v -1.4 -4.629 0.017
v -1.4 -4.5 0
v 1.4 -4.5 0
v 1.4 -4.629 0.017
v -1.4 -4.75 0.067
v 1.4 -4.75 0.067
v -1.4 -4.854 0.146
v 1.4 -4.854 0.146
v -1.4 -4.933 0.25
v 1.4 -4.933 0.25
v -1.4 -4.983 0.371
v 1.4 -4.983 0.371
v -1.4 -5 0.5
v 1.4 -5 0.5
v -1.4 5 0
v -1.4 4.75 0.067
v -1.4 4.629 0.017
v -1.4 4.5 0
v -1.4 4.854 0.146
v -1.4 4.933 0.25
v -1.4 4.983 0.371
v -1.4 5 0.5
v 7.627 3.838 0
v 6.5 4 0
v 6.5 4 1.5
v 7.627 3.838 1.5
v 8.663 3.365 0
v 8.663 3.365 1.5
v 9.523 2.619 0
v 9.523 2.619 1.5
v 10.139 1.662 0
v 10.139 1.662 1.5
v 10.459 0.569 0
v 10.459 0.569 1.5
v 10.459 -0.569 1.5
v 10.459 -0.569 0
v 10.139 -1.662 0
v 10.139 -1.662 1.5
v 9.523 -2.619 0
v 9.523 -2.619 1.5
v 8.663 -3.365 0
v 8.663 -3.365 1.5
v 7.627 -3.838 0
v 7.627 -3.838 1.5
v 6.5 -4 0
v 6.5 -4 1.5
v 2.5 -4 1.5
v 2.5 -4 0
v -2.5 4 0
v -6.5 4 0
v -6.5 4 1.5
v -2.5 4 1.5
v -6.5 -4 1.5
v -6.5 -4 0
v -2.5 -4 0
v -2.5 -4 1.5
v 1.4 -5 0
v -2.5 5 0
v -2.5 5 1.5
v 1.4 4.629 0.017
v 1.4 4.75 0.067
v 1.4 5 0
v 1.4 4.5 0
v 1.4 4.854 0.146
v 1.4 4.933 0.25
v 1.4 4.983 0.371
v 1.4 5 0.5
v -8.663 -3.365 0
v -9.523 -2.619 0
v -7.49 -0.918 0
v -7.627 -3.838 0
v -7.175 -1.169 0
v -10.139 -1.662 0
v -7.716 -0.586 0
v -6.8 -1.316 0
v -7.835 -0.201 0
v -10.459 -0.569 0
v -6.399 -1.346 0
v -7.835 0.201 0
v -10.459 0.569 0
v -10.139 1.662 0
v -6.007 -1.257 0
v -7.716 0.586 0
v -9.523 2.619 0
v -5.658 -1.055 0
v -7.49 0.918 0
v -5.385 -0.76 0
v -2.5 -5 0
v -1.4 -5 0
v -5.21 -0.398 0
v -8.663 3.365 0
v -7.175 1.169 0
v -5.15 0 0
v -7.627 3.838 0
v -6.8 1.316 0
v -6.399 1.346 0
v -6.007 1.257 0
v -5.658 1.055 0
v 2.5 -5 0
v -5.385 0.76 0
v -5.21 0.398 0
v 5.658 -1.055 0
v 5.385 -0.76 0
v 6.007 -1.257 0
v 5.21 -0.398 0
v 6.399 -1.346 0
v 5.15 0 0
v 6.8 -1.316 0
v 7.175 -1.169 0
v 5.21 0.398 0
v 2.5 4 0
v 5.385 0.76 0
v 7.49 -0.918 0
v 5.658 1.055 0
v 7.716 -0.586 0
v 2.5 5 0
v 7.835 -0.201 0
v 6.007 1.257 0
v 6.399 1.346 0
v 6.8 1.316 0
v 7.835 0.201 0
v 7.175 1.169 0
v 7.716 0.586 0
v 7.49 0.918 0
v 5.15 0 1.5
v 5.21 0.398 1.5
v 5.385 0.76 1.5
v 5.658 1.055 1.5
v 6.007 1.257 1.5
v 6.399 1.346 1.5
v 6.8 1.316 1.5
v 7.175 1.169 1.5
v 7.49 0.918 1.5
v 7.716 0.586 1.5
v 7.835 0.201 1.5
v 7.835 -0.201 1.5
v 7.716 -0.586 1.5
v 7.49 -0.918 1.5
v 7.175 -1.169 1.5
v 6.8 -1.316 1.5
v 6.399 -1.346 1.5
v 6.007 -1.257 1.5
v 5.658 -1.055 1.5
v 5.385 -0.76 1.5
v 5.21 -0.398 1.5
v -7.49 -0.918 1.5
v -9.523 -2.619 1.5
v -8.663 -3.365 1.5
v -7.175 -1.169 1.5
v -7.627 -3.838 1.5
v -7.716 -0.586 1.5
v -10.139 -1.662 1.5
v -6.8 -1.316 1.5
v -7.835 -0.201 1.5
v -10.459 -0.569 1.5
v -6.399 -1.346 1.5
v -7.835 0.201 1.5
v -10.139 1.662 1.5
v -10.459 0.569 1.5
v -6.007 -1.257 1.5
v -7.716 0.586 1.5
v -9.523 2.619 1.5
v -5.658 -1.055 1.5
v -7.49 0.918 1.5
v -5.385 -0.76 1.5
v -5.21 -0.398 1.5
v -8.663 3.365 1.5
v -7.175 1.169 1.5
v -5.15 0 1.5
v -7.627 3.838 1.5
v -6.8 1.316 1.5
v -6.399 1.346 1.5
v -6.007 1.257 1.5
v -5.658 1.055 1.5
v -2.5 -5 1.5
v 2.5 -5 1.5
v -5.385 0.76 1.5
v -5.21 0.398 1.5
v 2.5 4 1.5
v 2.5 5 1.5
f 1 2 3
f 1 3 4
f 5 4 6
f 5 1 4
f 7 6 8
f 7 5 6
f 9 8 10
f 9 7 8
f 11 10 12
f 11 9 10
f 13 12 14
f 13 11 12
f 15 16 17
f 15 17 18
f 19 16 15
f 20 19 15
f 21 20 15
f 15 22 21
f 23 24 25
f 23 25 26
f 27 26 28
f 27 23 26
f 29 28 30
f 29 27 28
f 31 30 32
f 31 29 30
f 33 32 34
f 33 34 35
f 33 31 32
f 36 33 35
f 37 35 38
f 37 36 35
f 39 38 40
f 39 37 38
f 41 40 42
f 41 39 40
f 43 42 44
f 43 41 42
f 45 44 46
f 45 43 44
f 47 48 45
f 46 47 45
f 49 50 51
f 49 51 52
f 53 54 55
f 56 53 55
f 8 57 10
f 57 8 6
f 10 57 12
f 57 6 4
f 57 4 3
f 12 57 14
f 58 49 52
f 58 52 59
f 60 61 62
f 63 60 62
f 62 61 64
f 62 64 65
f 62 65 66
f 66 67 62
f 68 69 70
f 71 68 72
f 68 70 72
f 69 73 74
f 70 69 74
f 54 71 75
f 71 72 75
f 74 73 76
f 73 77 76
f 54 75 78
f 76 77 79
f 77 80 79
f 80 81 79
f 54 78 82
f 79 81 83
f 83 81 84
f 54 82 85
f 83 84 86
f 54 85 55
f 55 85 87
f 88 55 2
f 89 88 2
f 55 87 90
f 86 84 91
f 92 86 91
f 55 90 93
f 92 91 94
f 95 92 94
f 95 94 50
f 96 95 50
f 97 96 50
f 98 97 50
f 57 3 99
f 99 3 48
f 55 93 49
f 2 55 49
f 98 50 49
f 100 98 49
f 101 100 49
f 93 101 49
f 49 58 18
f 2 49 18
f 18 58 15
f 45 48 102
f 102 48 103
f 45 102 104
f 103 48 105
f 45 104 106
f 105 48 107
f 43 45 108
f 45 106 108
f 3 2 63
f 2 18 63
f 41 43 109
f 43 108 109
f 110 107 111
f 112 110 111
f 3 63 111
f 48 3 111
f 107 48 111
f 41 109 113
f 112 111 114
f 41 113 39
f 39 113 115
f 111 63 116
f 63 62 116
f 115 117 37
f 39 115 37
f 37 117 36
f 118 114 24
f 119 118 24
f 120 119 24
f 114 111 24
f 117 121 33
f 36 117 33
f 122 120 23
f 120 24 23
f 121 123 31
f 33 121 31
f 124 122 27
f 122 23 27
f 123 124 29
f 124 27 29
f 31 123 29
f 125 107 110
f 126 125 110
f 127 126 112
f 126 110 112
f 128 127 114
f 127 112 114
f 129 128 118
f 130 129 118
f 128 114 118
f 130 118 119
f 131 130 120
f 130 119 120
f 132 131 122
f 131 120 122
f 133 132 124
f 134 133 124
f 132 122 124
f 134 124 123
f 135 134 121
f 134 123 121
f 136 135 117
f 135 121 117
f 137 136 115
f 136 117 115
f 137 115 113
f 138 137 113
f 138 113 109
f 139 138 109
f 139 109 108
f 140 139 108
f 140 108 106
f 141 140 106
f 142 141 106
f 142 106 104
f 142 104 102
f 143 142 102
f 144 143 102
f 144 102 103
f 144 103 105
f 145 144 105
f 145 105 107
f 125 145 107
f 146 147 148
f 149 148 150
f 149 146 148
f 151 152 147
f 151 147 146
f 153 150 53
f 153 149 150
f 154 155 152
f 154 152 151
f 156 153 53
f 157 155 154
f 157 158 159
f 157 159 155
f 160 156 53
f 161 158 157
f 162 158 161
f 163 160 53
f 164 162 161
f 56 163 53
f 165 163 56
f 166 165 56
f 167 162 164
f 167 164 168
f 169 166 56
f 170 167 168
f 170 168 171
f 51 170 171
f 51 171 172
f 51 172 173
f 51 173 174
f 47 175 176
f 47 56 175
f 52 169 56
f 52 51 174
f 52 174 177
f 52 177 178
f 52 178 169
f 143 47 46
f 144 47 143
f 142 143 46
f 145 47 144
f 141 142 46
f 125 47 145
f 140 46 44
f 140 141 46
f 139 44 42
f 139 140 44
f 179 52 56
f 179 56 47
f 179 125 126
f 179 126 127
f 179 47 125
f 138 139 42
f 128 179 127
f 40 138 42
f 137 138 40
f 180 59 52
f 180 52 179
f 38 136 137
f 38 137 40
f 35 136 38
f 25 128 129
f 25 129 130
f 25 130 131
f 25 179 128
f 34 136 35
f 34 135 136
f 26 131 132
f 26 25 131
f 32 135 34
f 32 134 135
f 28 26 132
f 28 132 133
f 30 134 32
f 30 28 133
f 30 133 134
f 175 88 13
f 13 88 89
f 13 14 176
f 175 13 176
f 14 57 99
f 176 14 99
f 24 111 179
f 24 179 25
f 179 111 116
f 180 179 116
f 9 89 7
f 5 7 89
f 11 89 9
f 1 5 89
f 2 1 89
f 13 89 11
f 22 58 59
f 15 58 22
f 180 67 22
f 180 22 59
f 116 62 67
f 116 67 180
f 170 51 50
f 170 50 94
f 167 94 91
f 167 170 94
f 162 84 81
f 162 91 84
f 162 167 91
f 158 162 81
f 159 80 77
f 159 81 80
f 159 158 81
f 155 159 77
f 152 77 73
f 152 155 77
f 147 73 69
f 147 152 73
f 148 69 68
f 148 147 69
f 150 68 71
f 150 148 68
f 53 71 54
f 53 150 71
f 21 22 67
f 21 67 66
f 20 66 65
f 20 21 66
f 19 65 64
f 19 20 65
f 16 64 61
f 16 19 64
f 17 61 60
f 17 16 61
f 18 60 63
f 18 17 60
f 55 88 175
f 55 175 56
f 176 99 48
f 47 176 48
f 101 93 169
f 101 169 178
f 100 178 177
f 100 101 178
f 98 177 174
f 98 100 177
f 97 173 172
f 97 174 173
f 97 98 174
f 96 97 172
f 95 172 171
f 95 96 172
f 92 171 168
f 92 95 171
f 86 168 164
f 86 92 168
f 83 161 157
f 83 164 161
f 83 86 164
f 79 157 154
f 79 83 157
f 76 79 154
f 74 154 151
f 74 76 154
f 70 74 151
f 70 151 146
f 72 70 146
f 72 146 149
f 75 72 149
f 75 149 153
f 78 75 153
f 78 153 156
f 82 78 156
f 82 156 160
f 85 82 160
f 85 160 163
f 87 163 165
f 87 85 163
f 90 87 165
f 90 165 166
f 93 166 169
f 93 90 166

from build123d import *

# Parameters (mm, degrees)
SKETCH_1_W           = 8
SKETCH_1_H           = 8
SKETCH_1_W_2         = 5
SKETCH_1_H_2         = 10
EXTRUDE_709_DEPTH    = 1.5
HOLE_WIZARD_M2_5_1_D = 2.7
FILLET_1_RADIUS      = 4
FILLET_1_LENGTH      = 1.5
FILLET_2_RADIUS      = 4
FILLET_2_LENGTH      = 1.5
FILLET_START         = -1.4
FILLET_3_DEPTH       = 2.8


with BuildPart() as part:
    # 草图1 → Extrude 709 (new body)
    with BuildSketch(Plane.XY):
        with Locations((6.5, 0)):
            Rectangle(SKETCH_1_W, SKETCH_1_H)
        Rectangle(SKETCH_1_W_2, SKETCH_1_H_2)
        with Locations((-6.5, 0)):
            Rectangle(SKETCH_1_W, SKETCH_1_H)
    extrude(amount=EXTRUDE_709_DEPTH)

    # M2.5 间隙孔1 (through all)
    with Locations(Plane.XY.offset(1.5)):
        with Locations((6.5, 0)):
            hole_wizard_m2_5_1 = Hole(HOLE_WIZARD_M2_5_1_D / 2)

    # 镜向2: M2.5 间隙孔1 across plane
    add(hole_wizard_m2_5_1.mirror(Plane(origin=(0, 0, 0), x_dir=(0, 0, 1), z_dir=(1, 0, 0))), mode=Mode.SUBTRACT)

    # 圆角1: full round fillet: the end face becomes a half cylinder, R = half its width
    fillet_1_face = Plane((10.5, 0, 0.75), x_dir=(0, 0, -1), z_dir=(1, 0, 0))  # on the end face: x along it, z out of the body
    fillet_1_slab = fillet_1_face.offset(-FILLET_1_RADIUS / 2) * Box(FILLET_1_LENGTH, 2 * FILLET_1_RADIUS, FILLET_1_RADIUS, mode=Mode.PRIVATE)  # the body's end, R deep
    fillet_1_round = Plane((6.5, 0, 0.75), x_dir=(1, 0, 0), z_dir=(0, 0, -1)) * Cylinder(FILLET_1_RADIUS, FILLET_1_LENGTH, mode=Mode.PRIVATE)  # its axis R under the face
    add(fillet_1_slab - fillet_1_round, mode=Mode.SUBTRACT)

    # 圆角2: full round fillet: the end face becomes a half cylinder, R = half its width
    fillet_2_face = Plane((-10.5, 0, 0.75), x_dir=(0, 0, 1), z_dir=(-1, 0, 0))  # on the end face: x along it, z out of the body
    fillet_2_slab = fillet_2_face.offset(-FILLET_2_RADIUS / 2) * Box(FILLET_2_LENGTH, 2 * FILLET_2_RADIUS, FILLET_2_RADIUS, mode=Mode.PRIVATE)  # the body's end, R deep
    fillet_2_round = Plane((-6.5, 0, 0.75), x_dir=(-1, 0, 0), z_dir=(0, 0, 1)) * Cylinder(FILLET_2_RADIUS, FILLET_2_LENGTH, mode=Mode.PRIVATE)  # its axis R under the face
    add(fillet_2_slab - fillet_2_round, mode=Mode.SUBTRACT)

    # 圆角3: read off the stored shape, not the designer's step
    # 圆角3 outline → 圆角3 (cut)
    with BuildSketch(Plane.YZ.offset(FILLET_START)):
        with BuildLine():
            Line((5, 0), (5, 0.5))
            ThreePointArc((5, 0.5), (4.853553391, 0.146446609), (4.5, 0))
            Line((4.5, 0), (5, 0))
        make_face()
        with BuildLine():
            Line((-5, 0), (-4.5, 0))
            ThreePointArc((-4.5, 0), (-4.853553391, 0.146446609), (-5, 0.5))
            Line((-5, 0.5), (-5, 0))
        make_face()
    extrude(amount=FILLET_3_DEPTH, mode=Mode.SUBTRACT)


solid = part.part
